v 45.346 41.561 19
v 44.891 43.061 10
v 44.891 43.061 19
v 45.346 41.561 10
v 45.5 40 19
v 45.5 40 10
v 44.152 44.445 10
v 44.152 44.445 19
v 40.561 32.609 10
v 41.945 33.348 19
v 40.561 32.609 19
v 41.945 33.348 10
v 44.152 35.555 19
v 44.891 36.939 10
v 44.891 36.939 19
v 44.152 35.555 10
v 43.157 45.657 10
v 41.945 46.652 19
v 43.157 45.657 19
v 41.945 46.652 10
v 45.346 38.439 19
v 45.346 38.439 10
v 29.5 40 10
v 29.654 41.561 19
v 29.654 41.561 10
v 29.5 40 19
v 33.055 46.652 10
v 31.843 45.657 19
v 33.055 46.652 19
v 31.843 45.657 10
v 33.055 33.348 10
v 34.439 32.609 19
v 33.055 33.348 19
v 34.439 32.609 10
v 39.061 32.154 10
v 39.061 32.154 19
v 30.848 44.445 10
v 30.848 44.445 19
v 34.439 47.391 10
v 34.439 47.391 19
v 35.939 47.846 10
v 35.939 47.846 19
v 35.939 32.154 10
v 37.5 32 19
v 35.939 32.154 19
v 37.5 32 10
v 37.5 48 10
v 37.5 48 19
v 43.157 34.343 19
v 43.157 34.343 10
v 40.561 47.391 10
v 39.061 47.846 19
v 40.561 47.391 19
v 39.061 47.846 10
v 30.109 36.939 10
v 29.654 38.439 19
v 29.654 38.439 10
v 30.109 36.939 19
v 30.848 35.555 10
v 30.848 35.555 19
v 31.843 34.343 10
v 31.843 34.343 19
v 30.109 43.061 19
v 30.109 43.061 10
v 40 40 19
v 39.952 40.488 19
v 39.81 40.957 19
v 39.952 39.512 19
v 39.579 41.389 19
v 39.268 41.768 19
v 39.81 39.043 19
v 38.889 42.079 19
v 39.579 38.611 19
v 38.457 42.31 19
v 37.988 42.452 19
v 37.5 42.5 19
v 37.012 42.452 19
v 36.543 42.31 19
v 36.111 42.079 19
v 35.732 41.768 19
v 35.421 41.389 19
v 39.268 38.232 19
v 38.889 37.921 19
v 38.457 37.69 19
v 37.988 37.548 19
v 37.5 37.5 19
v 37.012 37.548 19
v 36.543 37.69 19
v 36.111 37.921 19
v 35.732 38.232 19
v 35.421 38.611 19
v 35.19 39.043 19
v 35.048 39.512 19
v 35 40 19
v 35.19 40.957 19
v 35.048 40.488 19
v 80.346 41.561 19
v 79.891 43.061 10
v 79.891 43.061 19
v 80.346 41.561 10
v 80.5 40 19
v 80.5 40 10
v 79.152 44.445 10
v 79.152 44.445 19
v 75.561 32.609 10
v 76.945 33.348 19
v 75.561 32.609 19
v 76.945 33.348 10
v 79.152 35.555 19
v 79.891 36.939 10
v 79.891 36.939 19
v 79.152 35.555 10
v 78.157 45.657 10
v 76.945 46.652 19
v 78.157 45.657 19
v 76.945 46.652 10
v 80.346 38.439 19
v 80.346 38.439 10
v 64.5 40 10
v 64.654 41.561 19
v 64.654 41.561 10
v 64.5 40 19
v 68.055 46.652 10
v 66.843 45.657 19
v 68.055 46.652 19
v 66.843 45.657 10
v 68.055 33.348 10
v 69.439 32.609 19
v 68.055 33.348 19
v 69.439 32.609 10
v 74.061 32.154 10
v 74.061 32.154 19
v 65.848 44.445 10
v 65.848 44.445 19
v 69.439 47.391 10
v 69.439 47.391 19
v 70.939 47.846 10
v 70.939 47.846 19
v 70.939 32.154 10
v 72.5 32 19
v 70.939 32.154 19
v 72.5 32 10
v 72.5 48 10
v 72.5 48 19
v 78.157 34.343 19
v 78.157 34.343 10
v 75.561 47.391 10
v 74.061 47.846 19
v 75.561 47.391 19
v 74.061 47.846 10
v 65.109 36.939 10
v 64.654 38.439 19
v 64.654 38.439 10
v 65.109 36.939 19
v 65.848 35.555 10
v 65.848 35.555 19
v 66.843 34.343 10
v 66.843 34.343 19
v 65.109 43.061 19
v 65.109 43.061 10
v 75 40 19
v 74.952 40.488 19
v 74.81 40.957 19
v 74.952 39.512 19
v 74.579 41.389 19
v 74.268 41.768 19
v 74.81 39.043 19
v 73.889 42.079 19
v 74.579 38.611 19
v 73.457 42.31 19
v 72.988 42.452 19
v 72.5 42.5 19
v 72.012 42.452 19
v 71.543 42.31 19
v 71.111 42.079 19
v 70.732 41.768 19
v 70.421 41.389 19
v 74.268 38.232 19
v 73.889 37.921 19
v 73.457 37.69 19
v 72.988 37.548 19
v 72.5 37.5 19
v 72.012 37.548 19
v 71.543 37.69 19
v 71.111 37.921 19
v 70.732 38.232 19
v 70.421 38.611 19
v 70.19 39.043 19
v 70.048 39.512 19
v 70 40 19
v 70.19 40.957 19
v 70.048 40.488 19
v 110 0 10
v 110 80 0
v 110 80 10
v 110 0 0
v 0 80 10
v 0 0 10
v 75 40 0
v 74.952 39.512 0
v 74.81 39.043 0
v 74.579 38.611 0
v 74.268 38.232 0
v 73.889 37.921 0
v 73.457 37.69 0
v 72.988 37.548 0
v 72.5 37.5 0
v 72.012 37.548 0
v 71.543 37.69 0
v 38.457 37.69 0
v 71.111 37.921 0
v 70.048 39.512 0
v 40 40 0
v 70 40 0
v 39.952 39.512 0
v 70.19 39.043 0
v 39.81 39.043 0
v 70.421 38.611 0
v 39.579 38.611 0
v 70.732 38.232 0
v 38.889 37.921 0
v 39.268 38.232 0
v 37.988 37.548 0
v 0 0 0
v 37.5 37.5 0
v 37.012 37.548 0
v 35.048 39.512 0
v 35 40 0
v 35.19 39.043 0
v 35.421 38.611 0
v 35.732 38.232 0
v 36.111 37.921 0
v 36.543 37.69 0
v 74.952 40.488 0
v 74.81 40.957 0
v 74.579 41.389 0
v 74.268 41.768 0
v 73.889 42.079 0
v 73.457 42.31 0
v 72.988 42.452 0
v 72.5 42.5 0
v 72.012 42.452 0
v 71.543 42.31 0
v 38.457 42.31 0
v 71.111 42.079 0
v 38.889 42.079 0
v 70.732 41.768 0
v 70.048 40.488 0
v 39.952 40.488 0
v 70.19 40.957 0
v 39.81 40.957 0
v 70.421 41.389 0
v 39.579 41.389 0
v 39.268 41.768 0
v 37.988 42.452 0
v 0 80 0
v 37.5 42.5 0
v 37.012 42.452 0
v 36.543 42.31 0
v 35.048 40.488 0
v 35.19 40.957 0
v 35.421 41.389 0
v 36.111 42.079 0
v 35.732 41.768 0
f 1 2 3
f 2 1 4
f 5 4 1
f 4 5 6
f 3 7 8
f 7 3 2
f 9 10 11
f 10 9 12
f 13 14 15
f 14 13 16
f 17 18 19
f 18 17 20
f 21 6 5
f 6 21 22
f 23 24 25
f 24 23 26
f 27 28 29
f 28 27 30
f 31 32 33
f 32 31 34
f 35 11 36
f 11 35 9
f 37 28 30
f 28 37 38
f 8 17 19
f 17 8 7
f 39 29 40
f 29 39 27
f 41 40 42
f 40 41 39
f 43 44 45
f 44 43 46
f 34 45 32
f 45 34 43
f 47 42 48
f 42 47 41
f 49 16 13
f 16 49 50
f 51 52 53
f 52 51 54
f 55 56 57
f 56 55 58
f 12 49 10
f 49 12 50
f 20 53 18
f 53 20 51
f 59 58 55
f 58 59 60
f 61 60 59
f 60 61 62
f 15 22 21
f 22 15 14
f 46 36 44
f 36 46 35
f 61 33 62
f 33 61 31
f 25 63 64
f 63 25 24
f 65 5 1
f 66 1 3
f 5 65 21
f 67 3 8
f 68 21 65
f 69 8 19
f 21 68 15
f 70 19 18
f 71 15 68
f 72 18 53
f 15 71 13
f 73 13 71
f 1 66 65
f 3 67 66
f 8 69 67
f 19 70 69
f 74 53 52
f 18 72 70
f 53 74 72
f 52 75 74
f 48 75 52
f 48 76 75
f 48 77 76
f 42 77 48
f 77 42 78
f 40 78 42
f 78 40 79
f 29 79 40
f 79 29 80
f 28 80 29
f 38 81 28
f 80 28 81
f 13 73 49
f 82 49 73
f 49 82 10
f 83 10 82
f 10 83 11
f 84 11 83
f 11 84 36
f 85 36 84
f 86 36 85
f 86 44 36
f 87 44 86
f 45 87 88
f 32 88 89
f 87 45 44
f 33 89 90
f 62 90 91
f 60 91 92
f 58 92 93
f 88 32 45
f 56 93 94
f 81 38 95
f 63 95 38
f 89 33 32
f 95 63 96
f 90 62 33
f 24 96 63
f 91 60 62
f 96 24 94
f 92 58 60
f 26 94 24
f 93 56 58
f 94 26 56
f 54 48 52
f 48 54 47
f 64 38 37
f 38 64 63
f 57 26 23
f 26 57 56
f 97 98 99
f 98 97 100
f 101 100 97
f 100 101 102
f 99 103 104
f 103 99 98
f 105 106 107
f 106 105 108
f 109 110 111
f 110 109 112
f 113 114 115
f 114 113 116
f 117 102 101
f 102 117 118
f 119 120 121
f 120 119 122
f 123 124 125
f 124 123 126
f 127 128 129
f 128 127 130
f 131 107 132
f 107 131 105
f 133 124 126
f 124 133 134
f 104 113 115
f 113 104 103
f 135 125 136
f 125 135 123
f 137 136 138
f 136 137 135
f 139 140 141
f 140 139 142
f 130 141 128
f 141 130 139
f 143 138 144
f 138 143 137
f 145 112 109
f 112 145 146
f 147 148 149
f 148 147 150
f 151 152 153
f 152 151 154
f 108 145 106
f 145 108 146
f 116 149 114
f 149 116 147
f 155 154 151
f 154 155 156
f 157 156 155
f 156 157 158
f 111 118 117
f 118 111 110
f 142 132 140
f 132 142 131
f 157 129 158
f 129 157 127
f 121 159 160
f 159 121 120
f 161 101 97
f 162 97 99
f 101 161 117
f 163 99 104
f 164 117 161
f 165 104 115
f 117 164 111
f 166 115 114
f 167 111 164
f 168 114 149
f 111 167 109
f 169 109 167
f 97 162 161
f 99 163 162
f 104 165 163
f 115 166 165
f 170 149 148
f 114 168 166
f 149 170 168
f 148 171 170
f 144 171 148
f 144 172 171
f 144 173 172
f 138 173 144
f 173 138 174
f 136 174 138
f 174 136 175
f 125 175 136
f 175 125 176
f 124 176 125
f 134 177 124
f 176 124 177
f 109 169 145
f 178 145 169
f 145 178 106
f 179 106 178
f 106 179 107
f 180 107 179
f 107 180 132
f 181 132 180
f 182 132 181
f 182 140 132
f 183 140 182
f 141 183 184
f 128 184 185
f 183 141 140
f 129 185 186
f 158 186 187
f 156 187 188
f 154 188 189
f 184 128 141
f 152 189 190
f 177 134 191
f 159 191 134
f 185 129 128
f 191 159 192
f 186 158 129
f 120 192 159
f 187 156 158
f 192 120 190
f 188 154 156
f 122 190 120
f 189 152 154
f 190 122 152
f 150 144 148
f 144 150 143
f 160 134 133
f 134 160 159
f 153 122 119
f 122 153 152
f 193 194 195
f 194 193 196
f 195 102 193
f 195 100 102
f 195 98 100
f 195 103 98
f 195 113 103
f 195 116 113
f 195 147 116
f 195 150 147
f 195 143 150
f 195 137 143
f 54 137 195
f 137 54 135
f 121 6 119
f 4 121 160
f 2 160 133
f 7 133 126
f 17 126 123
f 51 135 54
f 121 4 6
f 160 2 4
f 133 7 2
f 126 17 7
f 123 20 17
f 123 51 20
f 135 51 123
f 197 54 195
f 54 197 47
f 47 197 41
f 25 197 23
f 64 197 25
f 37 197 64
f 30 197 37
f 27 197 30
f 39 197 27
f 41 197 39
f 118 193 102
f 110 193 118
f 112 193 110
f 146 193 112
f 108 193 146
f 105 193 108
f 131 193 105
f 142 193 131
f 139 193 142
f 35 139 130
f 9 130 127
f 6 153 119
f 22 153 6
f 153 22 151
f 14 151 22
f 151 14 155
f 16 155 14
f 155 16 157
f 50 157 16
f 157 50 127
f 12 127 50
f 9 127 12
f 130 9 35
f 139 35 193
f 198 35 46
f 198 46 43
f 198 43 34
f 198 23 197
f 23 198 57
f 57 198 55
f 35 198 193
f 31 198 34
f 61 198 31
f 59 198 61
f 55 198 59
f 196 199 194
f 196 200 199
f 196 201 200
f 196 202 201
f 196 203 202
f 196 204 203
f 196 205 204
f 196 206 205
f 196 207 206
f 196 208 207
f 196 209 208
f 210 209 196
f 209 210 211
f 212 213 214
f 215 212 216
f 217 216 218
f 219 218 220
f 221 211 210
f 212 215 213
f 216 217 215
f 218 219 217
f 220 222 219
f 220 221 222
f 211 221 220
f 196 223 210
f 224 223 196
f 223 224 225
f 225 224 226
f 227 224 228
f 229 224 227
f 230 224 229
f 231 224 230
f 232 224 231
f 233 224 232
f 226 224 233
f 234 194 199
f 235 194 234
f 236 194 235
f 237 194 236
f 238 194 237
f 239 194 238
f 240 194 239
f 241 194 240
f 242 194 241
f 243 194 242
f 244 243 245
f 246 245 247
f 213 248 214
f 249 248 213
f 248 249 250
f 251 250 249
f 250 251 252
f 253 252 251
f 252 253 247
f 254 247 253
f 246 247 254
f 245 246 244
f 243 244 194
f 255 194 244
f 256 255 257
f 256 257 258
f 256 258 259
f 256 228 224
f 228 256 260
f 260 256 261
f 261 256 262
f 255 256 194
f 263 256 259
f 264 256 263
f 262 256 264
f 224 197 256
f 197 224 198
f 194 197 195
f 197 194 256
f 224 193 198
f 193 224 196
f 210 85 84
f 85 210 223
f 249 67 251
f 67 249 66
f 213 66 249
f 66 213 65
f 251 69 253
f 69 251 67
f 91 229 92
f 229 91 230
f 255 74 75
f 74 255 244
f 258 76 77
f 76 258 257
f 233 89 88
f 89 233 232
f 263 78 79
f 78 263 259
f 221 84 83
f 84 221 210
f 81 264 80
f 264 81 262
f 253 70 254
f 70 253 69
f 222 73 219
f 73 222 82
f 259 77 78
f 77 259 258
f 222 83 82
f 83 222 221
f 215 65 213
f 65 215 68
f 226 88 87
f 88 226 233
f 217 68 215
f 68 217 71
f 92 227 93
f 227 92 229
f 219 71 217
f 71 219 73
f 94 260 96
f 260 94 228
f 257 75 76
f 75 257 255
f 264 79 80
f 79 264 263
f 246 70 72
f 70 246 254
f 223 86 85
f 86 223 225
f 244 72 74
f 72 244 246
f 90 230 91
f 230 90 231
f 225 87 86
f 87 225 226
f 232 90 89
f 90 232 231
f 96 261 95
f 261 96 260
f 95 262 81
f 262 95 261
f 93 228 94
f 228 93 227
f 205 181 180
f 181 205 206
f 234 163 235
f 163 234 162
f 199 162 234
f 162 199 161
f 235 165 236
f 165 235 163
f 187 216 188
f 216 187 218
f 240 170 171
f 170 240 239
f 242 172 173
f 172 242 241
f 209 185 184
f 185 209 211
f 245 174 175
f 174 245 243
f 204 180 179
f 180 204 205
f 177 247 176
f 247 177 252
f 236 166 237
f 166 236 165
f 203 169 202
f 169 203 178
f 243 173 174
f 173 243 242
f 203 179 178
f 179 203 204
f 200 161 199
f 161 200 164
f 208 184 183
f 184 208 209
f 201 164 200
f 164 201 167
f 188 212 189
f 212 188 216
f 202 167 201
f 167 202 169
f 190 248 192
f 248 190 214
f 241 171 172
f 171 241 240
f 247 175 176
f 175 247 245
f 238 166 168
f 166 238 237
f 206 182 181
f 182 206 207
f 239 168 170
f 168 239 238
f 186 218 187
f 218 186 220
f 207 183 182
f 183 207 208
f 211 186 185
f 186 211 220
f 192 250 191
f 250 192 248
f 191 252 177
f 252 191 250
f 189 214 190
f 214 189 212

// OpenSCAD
$fn = 32;

// ----------------------------------------------------------------------
// Drill jig: two_boss jig
// ----------------------------------------------------------------------

// --- parameters (mm) ---
plate_l = 110;            // plate length, X
plate_w = 80;             // plate width, Y
plate_t = 10;             // plate thickness
boss_d = 16;              // guide boss diameter
boss_h = 10;              // boss height above the plate
guide_d = 5;              // guide hole diameter
boss_pitch = 35;          // boss pitch

n_boss = 2;  // guide bosses
boss_x0 = (plate_l - (n_boss - 1) * boss_pitch) / 2;  // first boss X
boss_top = plate_t - 1 + boss_h;  // boss crown height
total_h = boss_top;  // overall height

difference() {
  union() {
  cube([plate_l, plate_w, plate_t]);
  for (i = [0 : n_boss - 1])
    translate([boss_x0 + i * boss_pitch, plate_w / 2, plate_t - 1])
      cylinder(h = boss_h, d = boss_d);
  }
  for (i = [0 : n_boss - 1])
    translate([boss_x0 + i * boss_pitch, plate_w / 2, -1])
      cylinder(h = plate_t + boss_h, d = guide_d);
}
